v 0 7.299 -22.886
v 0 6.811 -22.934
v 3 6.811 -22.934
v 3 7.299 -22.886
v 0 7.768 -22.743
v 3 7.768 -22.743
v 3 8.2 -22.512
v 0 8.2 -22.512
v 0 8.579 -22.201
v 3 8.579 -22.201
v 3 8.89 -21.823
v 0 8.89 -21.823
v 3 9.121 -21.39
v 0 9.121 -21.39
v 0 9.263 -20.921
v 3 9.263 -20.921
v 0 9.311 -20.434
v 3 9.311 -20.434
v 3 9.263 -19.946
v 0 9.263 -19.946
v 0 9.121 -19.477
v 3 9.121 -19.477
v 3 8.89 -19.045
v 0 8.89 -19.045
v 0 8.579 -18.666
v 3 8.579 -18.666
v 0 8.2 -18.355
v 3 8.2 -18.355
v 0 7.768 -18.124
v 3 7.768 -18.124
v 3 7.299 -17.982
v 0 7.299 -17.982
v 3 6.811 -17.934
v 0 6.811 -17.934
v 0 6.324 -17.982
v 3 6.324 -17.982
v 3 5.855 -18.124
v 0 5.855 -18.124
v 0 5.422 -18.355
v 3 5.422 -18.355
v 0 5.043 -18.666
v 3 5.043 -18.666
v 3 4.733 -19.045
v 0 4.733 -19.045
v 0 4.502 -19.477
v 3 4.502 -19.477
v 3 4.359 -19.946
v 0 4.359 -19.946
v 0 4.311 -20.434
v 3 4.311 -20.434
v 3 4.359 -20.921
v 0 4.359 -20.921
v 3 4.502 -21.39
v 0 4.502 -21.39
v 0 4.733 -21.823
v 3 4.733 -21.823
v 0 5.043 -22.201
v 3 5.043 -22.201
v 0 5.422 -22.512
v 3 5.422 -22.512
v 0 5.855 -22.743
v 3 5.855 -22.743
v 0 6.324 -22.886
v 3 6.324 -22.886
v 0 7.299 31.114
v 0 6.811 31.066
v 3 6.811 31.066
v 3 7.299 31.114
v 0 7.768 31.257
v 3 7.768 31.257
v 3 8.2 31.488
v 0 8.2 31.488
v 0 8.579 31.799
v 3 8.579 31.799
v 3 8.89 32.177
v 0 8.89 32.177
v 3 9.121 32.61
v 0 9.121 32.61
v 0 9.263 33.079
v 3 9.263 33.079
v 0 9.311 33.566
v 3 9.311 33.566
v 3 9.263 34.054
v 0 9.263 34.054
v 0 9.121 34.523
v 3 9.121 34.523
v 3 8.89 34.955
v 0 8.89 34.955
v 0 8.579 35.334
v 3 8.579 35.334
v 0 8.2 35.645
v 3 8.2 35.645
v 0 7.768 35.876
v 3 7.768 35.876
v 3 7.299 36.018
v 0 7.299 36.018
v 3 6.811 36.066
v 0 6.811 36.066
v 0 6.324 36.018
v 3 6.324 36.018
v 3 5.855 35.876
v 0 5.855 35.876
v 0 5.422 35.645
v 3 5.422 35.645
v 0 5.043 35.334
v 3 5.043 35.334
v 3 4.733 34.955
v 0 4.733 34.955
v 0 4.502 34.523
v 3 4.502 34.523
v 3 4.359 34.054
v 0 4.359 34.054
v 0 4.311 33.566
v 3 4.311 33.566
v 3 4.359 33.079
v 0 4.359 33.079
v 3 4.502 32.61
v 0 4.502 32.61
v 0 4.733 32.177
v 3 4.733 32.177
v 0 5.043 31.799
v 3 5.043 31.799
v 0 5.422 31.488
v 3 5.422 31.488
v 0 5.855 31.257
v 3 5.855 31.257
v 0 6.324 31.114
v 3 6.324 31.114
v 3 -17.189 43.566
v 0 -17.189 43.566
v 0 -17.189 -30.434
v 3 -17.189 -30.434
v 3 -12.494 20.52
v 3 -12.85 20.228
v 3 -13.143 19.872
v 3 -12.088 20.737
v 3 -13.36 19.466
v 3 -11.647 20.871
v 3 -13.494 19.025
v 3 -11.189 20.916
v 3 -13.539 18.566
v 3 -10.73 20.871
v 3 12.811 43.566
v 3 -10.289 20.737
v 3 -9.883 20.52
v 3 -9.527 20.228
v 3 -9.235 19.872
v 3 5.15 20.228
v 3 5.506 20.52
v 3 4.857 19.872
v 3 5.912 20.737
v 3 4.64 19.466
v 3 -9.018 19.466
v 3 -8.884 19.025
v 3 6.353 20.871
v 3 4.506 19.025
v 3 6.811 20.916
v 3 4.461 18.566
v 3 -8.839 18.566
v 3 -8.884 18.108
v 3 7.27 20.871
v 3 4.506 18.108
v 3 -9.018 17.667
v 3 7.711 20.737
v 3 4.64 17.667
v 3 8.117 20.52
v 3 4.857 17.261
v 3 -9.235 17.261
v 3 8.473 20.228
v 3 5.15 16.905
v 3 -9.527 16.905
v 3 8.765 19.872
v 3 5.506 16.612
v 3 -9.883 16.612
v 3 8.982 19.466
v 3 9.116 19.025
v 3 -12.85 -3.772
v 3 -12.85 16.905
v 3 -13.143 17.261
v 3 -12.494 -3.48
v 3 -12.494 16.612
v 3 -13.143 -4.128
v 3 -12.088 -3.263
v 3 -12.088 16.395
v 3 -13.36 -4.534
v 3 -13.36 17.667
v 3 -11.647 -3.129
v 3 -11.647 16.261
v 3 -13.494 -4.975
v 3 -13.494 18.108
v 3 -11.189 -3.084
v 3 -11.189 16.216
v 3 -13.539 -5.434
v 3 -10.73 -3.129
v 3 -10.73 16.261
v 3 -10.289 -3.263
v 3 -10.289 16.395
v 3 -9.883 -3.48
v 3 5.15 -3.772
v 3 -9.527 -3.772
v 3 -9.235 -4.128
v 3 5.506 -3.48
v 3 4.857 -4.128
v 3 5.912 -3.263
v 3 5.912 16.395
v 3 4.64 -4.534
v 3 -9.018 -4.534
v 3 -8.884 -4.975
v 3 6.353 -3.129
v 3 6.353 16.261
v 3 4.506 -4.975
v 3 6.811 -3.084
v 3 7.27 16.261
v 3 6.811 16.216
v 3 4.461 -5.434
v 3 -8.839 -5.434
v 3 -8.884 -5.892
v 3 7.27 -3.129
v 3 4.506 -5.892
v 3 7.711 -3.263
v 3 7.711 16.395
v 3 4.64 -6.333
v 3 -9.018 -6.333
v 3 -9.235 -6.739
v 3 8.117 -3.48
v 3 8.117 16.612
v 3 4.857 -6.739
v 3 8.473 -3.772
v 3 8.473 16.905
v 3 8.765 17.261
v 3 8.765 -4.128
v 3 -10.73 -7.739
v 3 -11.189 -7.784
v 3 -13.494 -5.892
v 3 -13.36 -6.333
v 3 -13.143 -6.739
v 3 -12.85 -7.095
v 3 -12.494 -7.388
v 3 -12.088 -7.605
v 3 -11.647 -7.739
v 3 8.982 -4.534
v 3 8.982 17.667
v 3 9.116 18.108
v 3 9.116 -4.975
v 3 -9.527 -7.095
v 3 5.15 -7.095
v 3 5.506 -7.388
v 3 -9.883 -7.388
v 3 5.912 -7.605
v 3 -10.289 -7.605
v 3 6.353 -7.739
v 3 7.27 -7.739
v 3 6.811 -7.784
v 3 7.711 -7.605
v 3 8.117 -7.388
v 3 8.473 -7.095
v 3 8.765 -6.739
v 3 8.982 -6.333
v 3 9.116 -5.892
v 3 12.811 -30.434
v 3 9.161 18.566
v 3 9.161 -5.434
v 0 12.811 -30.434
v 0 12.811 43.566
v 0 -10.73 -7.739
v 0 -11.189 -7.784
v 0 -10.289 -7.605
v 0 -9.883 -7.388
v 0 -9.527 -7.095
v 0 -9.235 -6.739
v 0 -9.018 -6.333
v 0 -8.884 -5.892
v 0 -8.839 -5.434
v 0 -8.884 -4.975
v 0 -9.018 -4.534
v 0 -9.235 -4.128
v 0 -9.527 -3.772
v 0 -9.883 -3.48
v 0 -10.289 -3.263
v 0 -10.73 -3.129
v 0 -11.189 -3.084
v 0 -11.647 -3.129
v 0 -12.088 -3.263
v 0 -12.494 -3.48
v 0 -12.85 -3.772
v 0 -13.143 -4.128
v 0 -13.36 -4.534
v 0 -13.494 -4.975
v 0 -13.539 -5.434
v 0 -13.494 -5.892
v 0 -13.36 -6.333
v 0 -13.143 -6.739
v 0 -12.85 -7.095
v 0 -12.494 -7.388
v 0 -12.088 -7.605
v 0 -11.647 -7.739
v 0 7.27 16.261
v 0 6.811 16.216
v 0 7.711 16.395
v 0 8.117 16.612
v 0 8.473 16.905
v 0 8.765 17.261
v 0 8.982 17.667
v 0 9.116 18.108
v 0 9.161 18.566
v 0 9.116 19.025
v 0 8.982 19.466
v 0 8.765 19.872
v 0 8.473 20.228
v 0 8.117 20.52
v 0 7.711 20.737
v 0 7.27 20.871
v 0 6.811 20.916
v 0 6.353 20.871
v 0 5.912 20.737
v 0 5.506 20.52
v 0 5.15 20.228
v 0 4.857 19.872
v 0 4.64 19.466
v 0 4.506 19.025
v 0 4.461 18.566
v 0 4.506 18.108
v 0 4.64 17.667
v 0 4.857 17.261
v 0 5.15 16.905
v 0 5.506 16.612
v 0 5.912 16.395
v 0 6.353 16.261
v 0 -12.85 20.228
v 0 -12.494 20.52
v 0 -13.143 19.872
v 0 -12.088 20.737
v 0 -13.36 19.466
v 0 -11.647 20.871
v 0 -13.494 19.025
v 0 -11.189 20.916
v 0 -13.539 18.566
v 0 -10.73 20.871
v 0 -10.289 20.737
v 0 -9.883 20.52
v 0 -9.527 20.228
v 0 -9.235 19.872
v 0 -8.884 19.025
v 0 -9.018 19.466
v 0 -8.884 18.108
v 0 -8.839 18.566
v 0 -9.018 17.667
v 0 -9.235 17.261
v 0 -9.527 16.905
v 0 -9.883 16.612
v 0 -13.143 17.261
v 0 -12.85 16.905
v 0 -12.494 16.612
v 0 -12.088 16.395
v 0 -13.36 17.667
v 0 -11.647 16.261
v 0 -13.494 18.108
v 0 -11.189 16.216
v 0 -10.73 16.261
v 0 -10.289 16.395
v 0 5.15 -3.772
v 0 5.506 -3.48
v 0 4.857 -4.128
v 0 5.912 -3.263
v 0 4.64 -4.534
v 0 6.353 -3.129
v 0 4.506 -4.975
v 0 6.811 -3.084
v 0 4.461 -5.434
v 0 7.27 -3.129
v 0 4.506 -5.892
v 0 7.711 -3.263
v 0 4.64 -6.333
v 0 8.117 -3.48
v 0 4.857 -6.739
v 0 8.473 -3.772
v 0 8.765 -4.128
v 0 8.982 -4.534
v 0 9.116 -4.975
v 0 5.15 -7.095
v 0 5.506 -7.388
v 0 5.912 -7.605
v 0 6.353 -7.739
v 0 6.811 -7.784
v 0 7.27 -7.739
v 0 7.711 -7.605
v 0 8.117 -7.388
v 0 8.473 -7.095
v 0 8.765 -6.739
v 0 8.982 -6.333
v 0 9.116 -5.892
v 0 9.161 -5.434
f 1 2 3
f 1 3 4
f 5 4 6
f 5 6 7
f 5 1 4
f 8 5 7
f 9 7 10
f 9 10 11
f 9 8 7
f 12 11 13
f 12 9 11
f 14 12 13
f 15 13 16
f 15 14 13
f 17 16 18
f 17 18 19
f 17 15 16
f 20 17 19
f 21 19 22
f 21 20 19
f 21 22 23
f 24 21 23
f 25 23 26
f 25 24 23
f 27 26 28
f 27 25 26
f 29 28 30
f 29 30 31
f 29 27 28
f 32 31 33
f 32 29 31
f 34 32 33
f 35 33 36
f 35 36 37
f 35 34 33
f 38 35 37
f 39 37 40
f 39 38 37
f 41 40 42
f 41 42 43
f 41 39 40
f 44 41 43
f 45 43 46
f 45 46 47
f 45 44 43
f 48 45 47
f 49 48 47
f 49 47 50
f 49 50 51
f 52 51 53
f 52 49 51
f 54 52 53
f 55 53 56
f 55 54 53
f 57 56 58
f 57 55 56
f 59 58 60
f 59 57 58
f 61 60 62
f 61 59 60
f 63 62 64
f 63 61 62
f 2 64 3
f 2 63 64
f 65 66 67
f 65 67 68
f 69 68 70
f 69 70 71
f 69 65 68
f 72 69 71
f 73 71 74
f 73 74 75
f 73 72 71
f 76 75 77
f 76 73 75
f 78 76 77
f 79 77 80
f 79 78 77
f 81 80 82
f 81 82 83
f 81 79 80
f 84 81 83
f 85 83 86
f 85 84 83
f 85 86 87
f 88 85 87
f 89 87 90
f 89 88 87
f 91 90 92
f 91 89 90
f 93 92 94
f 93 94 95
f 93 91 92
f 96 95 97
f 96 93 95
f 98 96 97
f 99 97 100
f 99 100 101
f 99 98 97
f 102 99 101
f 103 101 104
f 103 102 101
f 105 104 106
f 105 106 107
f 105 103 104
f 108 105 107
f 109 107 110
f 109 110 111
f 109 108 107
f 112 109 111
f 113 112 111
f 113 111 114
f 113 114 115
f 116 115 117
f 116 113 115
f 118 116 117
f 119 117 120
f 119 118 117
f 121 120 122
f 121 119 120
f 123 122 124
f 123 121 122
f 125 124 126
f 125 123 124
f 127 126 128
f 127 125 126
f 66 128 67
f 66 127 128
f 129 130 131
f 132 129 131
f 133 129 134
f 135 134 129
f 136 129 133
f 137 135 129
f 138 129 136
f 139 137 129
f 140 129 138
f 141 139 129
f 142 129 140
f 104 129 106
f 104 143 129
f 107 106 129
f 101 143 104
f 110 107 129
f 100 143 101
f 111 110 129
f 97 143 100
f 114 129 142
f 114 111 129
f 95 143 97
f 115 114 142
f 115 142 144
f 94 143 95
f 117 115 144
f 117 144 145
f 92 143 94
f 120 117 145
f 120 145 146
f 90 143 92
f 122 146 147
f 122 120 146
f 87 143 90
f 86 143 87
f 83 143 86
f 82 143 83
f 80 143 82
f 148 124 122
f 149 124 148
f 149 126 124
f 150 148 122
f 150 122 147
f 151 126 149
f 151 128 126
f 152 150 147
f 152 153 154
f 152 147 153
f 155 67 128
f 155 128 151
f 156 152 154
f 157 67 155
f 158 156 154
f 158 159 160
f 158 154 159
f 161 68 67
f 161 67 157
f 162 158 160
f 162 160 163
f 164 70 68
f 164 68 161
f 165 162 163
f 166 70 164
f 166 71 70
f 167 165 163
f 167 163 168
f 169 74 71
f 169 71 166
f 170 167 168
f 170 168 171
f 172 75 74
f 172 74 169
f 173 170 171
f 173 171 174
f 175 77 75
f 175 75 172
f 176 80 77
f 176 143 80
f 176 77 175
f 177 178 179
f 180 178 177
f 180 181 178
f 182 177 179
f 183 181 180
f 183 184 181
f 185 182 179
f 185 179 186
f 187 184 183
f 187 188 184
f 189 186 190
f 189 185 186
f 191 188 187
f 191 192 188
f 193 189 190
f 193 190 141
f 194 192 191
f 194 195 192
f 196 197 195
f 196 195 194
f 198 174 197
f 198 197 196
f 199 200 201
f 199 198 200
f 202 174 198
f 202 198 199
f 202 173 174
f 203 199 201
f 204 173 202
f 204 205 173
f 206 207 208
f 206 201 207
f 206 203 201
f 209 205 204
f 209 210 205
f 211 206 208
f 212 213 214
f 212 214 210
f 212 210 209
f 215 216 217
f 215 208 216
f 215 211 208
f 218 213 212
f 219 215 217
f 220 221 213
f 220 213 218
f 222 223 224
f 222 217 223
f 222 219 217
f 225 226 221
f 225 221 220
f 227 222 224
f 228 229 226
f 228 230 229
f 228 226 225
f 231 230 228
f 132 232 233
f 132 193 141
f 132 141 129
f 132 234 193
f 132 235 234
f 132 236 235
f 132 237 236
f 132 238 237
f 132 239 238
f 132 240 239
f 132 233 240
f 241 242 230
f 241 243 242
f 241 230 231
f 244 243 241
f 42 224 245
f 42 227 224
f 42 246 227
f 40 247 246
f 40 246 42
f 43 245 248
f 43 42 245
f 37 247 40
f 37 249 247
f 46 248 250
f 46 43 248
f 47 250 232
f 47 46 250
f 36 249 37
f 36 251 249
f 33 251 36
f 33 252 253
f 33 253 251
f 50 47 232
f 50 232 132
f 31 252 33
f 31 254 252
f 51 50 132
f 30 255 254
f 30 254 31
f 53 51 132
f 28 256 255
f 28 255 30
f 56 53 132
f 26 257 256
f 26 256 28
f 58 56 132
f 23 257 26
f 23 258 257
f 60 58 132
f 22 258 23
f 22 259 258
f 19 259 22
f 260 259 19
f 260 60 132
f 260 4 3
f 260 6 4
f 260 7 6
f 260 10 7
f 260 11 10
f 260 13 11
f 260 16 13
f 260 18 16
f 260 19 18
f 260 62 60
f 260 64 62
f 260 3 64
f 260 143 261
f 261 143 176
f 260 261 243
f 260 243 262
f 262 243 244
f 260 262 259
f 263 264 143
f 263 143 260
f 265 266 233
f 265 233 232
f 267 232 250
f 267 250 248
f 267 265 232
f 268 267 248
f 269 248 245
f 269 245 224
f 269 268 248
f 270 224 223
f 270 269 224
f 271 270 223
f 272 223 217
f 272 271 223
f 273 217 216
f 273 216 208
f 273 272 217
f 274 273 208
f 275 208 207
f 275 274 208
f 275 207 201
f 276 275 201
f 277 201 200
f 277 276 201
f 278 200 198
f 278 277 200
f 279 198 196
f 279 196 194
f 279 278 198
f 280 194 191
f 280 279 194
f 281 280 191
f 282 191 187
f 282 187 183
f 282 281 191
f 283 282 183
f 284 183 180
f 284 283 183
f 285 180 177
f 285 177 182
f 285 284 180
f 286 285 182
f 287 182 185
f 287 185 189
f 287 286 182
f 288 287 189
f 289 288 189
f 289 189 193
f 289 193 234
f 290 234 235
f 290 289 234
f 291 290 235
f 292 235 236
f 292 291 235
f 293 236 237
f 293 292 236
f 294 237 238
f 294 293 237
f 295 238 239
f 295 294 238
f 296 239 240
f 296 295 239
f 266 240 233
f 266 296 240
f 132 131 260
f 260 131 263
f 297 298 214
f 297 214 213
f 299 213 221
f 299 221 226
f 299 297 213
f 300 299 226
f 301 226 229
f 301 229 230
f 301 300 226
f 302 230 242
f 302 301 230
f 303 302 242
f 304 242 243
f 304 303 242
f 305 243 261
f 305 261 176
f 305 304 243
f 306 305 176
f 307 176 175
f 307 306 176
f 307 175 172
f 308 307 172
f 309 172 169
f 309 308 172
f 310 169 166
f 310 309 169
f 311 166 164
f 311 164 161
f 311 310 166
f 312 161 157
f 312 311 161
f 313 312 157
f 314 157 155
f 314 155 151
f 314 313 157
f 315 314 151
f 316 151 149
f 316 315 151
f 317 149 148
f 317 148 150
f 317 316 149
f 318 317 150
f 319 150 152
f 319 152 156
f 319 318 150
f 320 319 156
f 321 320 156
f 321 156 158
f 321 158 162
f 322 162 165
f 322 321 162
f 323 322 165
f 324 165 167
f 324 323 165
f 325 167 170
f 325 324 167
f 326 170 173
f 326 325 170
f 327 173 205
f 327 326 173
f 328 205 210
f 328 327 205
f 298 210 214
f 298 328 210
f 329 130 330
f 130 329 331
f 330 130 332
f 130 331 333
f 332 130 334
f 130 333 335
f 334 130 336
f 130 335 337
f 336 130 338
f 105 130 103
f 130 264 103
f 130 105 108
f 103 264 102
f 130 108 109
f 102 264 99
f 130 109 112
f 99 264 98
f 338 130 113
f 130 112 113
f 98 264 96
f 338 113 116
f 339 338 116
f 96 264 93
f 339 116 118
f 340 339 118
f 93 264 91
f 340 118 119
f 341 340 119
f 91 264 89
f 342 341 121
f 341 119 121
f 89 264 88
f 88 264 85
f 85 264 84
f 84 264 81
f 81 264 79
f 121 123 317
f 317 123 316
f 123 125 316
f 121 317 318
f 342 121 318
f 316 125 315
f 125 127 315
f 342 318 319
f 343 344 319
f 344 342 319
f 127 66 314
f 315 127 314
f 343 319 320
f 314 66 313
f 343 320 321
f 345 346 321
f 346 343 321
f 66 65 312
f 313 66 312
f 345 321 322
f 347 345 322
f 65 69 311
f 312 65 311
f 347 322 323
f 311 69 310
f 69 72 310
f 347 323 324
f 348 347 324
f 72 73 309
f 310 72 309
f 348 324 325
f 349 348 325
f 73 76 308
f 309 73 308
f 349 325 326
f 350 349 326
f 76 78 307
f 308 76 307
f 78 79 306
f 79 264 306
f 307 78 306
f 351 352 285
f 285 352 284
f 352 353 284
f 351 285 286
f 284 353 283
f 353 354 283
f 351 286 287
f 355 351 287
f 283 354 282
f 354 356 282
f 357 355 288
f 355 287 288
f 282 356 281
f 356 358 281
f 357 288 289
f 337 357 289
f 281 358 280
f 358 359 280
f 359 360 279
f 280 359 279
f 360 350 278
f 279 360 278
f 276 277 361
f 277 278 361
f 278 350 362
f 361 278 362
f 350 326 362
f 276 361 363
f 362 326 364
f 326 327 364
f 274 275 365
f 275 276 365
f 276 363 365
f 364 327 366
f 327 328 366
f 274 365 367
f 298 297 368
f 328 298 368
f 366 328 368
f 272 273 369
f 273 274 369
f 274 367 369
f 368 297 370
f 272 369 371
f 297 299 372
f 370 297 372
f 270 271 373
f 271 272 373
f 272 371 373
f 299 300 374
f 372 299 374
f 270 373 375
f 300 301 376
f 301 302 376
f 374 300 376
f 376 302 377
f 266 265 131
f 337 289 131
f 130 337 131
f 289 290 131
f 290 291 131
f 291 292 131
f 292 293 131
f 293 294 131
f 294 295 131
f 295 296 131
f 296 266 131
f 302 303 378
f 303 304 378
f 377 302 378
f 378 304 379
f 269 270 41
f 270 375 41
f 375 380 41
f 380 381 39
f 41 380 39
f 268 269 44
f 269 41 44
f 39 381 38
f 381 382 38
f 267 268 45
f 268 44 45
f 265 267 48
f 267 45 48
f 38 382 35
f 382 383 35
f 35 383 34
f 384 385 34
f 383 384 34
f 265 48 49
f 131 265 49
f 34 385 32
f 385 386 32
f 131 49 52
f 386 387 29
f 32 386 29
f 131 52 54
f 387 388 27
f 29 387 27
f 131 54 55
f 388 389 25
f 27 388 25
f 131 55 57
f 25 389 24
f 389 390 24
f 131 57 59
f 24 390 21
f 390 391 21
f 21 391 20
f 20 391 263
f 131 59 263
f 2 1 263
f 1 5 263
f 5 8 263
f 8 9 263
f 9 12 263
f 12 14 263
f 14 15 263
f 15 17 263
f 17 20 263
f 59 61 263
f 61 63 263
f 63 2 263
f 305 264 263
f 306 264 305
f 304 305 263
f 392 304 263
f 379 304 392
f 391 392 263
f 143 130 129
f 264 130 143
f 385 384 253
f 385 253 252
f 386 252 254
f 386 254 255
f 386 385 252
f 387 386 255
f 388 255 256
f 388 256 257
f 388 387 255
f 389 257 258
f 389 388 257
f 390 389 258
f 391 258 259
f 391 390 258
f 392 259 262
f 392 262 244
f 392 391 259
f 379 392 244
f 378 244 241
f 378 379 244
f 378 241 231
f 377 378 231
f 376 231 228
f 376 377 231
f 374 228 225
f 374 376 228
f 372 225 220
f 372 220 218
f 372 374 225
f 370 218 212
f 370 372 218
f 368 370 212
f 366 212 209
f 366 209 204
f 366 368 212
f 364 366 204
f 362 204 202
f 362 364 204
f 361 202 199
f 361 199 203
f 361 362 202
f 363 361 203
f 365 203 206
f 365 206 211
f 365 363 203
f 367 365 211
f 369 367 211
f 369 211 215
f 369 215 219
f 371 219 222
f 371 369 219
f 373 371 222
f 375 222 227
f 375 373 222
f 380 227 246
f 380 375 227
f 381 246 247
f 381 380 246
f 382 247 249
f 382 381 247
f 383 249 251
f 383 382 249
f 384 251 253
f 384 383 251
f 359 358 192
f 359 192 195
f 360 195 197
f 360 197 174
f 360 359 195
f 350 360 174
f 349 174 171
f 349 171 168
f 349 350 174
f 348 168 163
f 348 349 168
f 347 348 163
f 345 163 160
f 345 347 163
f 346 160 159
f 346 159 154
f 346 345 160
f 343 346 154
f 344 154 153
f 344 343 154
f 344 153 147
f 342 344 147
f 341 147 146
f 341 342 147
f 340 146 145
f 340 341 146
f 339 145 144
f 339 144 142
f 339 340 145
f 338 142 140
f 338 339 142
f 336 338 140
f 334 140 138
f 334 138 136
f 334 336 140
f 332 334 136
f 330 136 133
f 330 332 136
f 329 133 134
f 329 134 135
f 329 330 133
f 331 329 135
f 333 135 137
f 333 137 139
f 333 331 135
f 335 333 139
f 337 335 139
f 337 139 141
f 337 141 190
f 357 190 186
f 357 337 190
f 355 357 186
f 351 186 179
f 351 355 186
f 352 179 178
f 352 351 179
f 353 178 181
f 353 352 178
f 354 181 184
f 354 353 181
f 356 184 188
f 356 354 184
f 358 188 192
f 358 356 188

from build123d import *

# Parameters (mm, degrees)
SKETCH1_W           = 17
SKETCH1_H           = 30
SKETCH1_R           = 2.5
SKETCH1_W_2         = 40
SKETCH1_R_2         = 2.35
BOSS_EXTRUDE1_DEPTH = 3


with BuildPart() as part:
    # Sketch1 → Boss-Extrude1 (new body)
    # profile 1 of 3: a face of its own
    with BuildSketch(Plane(origin=(0, 0, 0), x_dir=(0, 0, -1), z_dir=(1, 0, 0))):
        with Locations((21.933683822, -2.188772059)):
            Rectangle(SKETCH1_W, SKETCH1_H)
        with Locations((20.433683822, 6.811227941)):
            Circle(SKETCH1_R, mode=Mode.SUBTRACT)
    # profile 2 of 3: a face of its own
    with BuildSketch(Plane(origin=(0, 0, 0), x_dir=(0, 0, -1), z_dir=(1, 0, 0))):
        with Locations((-6.566316178, -2.188772059)):
            Rectangle(SKETCH1_W_2, SKETCH1_H)
        with Locations((-18.566316178, 6.811227941)):
            Circle(SKETCH1_R_2, mode=Mode.SUBTRACT)
        with Locations((5.433683822, 6.811227941)):
            Circle(SKETCH1_R_2, mode=Mode.SUBTRACT)
        with Locations((5.433683822, -11.188772059)):
            Circle(SKETCH1_R_2, mode=Mode.SUBTRACT)
        with Locations((-18.566316178, -11.188772059)):
            Circle(SKETCH1_R_2, mode=Mode.SUBTRACT)
    # profile 3 of 3: a face of its own
    with BuildSketch(Plane(origin=(0, 0, 0), x_dir=(0, 0, -1), z_dir=(1, 0, 0))):
        with Locations((-35.066316178, -2.188772059)):
            Rectangle(SKETCH1_W, SKETCH1_H)
        with Locations((-33.566316178, 6.811227941)):
            Circle(SKETCH1_R, mode=Mode.SUBTRACT)
    extrude(amount=BOSS_EXTRUDE1_DEPTH)


solid = part.part
